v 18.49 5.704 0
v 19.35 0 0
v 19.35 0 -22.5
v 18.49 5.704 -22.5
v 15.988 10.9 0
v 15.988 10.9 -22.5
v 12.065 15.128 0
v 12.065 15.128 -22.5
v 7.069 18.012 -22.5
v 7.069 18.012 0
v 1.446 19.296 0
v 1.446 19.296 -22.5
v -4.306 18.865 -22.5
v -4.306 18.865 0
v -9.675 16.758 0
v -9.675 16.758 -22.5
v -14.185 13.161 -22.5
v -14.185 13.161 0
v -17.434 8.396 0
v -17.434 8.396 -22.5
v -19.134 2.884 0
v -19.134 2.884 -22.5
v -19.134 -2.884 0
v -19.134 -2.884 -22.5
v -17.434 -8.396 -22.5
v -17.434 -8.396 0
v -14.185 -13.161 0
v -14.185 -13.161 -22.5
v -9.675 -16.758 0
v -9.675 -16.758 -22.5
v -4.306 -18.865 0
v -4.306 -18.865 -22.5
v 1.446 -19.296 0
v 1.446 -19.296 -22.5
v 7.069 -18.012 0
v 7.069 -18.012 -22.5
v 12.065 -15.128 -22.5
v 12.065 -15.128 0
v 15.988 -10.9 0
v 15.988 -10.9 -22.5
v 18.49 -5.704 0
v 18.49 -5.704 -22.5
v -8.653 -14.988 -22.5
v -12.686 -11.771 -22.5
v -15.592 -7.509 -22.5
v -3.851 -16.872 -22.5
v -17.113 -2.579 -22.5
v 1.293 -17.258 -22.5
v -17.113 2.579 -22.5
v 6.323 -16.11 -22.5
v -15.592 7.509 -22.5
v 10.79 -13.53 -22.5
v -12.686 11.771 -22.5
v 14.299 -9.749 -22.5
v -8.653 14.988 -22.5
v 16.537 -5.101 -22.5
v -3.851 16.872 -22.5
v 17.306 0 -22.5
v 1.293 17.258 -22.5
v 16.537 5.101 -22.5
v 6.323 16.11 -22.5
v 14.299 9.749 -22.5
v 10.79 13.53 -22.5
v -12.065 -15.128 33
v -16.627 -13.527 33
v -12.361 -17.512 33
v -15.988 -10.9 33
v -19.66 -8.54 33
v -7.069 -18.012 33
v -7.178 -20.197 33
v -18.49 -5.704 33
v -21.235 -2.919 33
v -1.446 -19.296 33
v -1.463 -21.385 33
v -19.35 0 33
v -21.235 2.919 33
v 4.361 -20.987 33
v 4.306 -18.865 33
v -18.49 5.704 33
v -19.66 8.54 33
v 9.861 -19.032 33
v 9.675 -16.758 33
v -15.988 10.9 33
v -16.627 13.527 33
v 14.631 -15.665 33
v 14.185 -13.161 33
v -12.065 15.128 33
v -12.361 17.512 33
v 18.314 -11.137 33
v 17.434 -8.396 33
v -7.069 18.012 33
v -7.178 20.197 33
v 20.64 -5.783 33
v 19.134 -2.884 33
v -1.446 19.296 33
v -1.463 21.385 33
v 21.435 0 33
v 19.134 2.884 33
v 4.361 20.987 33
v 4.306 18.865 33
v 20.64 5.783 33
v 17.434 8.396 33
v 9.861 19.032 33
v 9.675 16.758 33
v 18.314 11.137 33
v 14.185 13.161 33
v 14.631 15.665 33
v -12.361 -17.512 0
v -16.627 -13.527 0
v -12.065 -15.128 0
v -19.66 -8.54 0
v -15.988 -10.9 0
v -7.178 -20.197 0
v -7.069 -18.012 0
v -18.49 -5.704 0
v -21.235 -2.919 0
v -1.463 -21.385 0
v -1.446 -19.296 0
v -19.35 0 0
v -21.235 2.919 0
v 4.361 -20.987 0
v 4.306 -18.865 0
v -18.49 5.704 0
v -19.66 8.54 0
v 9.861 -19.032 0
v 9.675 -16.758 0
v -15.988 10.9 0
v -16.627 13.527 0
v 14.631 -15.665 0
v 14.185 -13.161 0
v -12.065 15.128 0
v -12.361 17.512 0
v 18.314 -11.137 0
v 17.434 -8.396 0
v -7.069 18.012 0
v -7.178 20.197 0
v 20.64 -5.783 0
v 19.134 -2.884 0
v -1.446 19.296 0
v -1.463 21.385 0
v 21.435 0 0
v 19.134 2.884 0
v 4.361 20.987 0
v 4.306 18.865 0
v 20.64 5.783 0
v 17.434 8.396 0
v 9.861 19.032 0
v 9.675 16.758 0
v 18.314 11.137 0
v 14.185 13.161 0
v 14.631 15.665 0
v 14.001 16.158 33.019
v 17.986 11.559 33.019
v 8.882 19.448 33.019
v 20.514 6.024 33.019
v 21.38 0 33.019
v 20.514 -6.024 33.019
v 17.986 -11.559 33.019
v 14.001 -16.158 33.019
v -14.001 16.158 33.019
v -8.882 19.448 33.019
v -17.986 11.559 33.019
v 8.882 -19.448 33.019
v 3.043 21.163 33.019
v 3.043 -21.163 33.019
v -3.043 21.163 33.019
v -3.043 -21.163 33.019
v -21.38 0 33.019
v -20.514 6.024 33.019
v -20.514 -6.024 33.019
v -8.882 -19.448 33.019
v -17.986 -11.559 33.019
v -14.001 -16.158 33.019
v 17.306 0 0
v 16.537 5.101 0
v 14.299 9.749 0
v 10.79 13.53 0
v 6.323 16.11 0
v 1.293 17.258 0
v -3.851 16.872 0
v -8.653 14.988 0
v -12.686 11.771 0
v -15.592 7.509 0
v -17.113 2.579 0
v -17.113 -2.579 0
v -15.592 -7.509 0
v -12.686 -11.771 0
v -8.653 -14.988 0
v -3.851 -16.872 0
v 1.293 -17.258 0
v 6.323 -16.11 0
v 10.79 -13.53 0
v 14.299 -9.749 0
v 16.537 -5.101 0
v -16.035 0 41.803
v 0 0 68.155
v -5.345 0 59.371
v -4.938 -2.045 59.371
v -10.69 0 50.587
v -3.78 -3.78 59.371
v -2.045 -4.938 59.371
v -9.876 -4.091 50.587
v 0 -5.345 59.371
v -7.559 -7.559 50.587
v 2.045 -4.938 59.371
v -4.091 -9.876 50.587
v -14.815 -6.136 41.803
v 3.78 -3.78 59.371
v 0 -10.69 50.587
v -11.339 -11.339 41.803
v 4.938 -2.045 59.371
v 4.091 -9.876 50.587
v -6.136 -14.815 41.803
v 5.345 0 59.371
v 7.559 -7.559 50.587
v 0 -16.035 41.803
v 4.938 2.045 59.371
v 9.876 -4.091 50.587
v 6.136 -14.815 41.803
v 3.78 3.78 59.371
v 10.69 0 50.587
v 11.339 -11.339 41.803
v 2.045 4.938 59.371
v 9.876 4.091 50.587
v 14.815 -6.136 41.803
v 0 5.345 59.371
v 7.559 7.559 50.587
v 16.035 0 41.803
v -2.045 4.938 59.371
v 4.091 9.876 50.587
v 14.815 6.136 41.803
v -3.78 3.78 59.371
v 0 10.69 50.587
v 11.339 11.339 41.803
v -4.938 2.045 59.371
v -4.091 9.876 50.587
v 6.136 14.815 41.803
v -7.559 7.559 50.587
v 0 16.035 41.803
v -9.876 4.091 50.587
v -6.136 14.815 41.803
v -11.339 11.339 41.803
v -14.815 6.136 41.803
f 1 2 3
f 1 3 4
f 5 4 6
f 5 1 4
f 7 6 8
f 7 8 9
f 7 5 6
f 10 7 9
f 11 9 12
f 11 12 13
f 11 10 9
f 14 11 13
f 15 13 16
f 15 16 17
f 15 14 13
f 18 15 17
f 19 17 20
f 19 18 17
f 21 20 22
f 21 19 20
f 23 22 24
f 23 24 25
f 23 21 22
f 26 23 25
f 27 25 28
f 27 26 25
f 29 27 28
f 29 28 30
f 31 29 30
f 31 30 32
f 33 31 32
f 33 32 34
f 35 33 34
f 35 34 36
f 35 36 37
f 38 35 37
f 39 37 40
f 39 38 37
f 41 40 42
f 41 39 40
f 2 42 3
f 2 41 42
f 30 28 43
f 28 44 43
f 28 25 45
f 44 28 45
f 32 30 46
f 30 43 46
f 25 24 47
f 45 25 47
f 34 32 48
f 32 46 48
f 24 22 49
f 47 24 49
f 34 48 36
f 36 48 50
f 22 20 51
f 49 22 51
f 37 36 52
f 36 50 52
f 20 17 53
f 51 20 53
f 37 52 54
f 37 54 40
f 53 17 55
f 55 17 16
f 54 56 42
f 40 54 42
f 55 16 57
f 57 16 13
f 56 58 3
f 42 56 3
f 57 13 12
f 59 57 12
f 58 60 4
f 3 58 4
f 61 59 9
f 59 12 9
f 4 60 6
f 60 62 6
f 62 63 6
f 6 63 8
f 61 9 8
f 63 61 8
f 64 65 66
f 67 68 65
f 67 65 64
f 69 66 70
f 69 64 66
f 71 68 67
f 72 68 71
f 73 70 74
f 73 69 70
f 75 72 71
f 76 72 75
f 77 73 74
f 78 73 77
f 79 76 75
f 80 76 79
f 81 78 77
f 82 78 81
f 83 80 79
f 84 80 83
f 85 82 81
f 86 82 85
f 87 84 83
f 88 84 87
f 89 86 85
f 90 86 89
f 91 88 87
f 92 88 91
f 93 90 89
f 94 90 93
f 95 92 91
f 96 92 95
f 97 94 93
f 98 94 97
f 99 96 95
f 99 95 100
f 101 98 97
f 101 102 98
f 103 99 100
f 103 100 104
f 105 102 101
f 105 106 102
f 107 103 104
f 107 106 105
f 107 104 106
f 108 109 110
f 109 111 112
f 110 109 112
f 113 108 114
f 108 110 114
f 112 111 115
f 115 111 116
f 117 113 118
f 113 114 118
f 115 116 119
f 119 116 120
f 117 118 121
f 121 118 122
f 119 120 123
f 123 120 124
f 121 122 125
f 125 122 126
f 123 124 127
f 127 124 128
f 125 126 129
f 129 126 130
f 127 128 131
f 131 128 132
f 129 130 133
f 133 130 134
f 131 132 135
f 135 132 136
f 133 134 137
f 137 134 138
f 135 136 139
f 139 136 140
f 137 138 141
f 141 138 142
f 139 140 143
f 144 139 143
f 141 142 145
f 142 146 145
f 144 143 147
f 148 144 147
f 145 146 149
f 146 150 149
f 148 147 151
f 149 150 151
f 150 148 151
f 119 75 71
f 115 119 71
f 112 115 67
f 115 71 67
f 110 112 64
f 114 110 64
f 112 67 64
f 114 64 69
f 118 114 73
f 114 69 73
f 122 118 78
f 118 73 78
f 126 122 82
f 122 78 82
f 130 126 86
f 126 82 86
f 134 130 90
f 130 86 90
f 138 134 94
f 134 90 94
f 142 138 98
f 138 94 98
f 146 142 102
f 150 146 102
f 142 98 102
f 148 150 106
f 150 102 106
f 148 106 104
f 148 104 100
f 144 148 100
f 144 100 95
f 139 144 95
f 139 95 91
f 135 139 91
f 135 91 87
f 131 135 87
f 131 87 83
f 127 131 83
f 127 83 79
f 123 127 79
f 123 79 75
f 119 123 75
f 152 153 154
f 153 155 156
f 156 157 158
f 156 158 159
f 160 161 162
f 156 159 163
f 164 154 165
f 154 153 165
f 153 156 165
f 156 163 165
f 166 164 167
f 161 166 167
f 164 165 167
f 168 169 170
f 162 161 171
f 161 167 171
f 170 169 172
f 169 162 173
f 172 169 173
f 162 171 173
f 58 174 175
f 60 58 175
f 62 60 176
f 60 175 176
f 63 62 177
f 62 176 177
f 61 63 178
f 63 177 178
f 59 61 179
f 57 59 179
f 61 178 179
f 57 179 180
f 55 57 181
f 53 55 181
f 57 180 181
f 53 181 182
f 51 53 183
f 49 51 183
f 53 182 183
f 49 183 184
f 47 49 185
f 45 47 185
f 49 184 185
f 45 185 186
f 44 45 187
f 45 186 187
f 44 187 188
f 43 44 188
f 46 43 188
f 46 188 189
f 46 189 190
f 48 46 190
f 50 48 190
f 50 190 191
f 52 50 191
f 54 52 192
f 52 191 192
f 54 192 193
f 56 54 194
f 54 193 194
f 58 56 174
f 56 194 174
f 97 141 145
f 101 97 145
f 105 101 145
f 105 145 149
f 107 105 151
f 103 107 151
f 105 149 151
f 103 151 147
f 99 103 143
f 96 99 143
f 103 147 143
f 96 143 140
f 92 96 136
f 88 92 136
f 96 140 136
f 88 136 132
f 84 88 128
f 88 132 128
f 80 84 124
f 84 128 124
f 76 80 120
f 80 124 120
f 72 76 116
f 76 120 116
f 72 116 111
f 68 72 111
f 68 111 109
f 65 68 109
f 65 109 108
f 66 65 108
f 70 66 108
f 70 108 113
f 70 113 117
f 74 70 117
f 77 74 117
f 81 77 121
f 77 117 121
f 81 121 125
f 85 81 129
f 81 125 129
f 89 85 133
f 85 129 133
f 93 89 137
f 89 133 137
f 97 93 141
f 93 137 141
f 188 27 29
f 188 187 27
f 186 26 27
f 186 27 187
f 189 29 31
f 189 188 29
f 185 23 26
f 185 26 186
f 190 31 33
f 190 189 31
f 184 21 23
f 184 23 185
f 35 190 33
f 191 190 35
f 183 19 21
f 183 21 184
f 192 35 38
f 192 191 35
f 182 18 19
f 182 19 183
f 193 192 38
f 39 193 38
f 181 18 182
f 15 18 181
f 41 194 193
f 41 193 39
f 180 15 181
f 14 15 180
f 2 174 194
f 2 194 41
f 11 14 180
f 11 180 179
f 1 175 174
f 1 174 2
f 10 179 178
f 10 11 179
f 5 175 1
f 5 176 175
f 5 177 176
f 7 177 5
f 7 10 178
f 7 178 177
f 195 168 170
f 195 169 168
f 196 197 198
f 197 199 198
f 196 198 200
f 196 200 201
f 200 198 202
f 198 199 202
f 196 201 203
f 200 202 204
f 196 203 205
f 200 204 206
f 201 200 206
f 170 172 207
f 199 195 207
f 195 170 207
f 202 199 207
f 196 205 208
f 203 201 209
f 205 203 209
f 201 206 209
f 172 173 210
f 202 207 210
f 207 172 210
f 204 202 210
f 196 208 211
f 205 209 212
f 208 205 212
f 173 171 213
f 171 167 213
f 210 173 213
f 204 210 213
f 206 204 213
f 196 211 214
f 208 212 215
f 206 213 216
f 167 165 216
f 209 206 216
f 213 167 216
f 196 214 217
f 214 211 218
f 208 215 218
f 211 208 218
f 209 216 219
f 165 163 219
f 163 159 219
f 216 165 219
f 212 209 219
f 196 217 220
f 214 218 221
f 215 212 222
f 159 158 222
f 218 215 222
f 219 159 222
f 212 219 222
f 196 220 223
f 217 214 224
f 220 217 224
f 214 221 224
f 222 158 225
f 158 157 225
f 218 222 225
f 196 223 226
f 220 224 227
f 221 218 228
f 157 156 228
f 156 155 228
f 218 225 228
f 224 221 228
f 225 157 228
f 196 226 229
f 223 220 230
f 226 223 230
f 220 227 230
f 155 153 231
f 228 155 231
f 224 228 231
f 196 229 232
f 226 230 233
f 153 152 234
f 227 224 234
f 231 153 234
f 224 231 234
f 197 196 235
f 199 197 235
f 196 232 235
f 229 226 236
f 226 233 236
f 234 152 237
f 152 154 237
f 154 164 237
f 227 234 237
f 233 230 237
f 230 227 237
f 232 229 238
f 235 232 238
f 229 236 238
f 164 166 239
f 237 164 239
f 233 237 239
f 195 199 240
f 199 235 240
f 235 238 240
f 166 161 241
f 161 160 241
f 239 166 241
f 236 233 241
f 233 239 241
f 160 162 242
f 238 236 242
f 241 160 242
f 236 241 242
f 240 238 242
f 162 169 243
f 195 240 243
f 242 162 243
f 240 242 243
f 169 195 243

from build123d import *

# Parameters (mm, degrees)
F0_R      = 21.435
F1_DEPTH  = 33
F3_D      = 38.7
F5_R      = 19.35
F5_R_2    = 17.30612453
F6_DEPTH  = 22.5
F9_R      = 30.1459456729
F9_R_2    = 21.435
F10_DEPTH = 71.5


with BuildPart() as f1:
    # F0 (on Top) → F1 (new body)
    with BuildSketch(Plane.XY):
        Circle(F0_R)
    extrude(amount=F1_DEPTH)

    # F3 (through all)
    with Locations(Plane(origin=(0, 0, 0), x_dir=(1, 0, 0), z_dir=(0, 0, -1))):
        with Locations((0, 0)):
            Hole(F3_D / 2)

    # F9 (on face) → F10 (cut)
    with BuildSketch(Plane.XY.offset(33)):
        Circle(F9_R)
        Circle(F9_R_2, mode=Mode.SUBTRACT)
    extrude(amount=-F10_DEPTH, mode=Mode.SUBTRACT)


with BuildPart() as f6:
    # F5 (on Top) → F6 (new body)
    with BuildSketch(Plane.XY):
        Circle(F5_R)
        Circle(F5_R_2, mode=Mode.SUBTRACT)
    extrude(amount=-F6_DEPTH)


with BuildPart() as f8:
    # F7 (on Front) → F8 (revolve)
    with BuildSketch(Plane.XZ):
        Polygon((0, 68.1551247835), (-21.3802363724, 33.0190360546), (0, 33.0190360546), align=None)
    revolve(axis=Axis((0, 0, 16.2957850844), (0, 0, 1)))


solid = Compound([f1.part, f6.part, f8.part])
